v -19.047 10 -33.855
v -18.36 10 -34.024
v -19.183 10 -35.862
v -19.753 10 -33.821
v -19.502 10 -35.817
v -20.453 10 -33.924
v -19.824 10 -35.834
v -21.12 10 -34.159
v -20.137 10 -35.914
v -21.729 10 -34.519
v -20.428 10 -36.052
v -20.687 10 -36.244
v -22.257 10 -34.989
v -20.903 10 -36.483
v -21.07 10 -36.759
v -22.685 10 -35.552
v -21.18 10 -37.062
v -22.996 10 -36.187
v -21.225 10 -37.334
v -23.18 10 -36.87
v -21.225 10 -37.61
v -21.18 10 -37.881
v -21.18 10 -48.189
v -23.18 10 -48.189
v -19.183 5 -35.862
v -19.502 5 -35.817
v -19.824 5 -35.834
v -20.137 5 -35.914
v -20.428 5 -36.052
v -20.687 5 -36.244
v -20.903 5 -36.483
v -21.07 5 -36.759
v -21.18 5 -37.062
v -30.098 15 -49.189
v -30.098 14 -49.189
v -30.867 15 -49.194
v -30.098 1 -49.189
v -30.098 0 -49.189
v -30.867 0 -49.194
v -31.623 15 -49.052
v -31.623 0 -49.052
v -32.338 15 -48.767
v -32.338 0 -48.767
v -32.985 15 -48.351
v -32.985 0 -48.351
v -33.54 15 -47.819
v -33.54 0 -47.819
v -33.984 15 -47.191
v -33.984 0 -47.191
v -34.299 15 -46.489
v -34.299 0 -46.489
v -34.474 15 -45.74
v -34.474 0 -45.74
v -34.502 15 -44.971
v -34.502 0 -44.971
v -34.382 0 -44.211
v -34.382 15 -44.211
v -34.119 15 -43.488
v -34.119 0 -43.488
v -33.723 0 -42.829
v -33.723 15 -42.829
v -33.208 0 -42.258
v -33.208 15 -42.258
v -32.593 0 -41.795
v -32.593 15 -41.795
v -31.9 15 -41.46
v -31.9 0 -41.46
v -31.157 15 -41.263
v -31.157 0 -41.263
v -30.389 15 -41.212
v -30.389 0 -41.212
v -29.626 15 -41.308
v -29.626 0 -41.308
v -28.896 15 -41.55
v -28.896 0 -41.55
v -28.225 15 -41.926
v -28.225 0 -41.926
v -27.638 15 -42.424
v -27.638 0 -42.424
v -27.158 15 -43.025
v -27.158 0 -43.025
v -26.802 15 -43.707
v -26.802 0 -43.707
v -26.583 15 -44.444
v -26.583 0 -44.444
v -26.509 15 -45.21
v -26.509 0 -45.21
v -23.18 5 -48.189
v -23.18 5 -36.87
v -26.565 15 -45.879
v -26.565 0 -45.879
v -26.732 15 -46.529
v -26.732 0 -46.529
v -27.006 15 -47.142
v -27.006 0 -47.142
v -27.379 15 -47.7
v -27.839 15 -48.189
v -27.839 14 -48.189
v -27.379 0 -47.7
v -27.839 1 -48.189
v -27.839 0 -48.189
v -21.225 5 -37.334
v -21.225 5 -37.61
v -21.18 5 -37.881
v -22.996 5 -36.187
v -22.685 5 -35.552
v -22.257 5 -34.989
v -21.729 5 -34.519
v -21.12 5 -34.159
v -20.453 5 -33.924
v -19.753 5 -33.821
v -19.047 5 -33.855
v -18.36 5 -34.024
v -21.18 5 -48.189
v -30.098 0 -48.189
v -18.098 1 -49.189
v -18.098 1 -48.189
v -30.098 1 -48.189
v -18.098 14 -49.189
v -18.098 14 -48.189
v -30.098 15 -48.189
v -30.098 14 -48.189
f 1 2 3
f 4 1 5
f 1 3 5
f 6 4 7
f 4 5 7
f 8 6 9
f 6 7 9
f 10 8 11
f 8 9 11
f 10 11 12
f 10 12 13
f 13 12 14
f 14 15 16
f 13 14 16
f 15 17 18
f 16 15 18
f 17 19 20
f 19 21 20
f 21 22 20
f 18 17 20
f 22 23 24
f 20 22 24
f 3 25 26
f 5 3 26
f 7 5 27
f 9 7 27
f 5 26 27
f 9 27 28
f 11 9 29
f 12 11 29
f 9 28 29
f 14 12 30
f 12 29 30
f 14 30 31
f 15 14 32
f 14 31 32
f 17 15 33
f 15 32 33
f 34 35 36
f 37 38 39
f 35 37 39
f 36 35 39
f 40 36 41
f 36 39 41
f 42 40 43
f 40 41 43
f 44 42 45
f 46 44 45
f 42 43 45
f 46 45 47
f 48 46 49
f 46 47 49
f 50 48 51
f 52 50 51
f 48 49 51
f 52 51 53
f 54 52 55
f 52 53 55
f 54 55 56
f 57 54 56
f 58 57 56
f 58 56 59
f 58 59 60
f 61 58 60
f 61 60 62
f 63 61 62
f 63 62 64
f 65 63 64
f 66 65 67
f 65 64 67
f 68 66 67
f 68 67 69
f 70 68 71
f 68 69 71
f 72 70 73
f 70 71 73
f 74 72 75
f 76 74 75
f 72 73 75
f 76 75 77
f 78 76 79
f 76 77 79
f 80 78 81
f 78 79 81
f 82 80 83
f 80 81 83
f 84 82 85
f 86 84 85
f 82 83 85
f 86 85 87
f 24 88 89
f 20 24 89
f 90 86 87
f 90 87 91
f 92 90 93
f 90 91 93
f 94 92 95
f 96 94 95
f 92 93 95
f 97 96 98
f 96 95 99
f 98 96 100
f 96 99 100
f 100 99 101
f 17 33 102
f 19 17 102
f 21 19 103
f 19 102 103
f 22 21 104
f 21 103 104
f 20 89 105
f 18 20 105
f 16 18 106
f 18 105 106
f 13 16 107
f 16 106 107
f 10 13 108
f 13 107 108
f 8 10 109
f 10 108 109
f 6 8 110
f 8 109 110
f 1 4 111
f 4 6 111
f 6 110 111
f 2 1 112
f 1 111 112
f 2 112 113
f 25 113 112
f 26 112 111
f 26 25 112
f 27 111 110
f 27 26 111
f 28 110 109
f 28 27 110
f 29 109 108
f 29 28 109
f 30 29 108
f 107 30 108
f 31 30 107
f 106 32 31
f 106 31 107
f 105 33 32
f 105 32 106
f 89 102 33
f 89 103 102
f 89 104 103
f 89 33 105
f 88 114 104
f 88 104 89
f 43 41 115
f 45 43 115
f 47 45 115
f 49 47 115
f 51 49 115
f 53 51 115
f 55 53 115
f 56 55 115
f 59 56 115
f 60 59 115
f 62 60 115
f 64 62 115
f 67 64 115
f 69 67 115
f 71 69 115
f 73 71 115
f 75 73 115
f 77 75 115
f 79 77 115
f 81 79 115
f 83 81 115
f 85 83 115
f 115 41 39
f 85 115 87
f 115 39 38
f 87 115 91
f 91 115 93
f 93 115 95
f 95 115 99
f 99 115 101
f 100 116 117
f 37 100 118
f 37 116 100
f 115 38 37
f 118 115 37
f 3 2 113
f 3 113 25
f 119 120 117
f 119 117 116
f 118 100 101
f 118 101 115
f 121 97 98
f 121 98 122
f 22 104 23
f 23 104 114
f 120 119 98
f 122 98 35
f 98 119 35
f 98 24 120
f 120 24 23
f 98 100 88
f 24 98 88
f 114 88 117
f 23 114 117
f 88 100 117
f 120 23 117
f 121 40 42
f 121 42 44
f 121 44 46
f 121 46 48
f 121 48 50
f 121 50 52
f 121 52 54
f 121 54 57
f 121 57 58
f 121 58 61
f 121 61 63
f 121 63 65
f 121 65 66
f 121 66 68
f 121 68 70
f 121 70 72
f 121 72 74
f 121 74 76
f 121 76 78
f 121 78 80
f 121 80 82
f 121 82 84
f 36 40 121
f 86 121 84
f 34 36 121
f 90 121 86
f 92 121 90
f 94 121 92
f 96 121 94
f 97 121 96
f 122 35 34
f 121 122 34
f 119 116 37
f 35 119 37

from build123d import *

# Parameters (mm, degrees)
BOSS_EXTRUDE1_DEPTH = 15
SKETCH2_W           = 12
SKETCH2_H           = 1
CUT_EXTRUDE1_DEPTH  = 1
SKETCH5_W           = 6.028776927
SKETCH5_H           = 6.351314433
SKETCH5_W_2         = 5.976909526
SKETCH5_H_2         = 6.219071559
CUT_EXTRUDE2_DEPTH  = 21


with BuildPart() as part:
    # Sketch1 → Boss-Extrude1 (new body)
    with BuildSketch(Plane(origin=(0, 0, 0), x_dir=(1, 0, 0), z_dir=(0, 1, 0))):
        with BuildLine():
            ThreePointArc((-26.508767977, 45.209827562), (-26.856482836, 46.841027505), (-27.839174603, 48.188631218))
            Line((-27.839174603, 48.188631218), (-30.097524166, 48.188631218))
            Line((-30.097524166, 48.188631218), (-30.097524166, 49.188631218))
            ThreePointArc((-30.097524166, 49.188631218), (-33.479035241, 42.530739587), (-26.508767977, 45.209827562))
        make_face()
        with BuildLine():
            Line((-30.097524166, 48.188631218), (-27.839174603, 48.188631218))
            ThreePointArc((-27.839174603, 48.188631218), (-28.889234266, 48.86730081), (-30.097524166, 49.188631218))
            Line((-30.097524166, 49.188631218), (-30.097524166, 48.188631218))
        make_face()
        with BuildLine():
            Line((-27.839174603, 48.188631218), (-23.179530848, 48.188631218))
            Line((-23.179530848, 48.188631218), (-21.179530848, 48.188631218))
            Line((-21.179530848, 48.188631218), (-18.097524166, 48.188631218))
            Line((-18.097524166, 48.188631218), (-18.097524166, 49.188631218))
            Line((-18.097524166, 49.188631218), (-30.097524166, 49.188631218))
            ThreePointArc((-30.097524166, 49.188631218), (-28.889234266, 48.86730081), (-27.839174603, 48.188631218))
        make_face()
        with BuildLine():
            Line((-23.179530848, 48.188631218), (-23.179530848, 38.073593242))
            ThreePointArc((-23.179530848, 38.073593242), (-22.504394786, 39.656834499), (-21.179530848, 40.755559728))
            Line((-21.179530848, 40.755559728), (-21.179530848, 48.188631218))
            Line((-21.179530848, 48.188631218), (-23.179530848, 48.188631218))
        make_face()
        with BuildLine():
            Line((-21.179530848, 36.869987329), (-21.179530848, 37.062229248))
            ThreePointArc((-21.179530848, 37.062229248), (-21.23095476, 37.471790285), (-21.179530848, 37.881351323))
            Line((-21.179530848, 37.881351323), (-21.179530848, 40.755559728))
            ThreePointArc((-21.179530848, 40.755559728), (-22.504394786, 39.656834499), (-23.179530848, 38.073593242))
            Line((-23.179530848, 38.073593242), (-23.179530848, 36.869987329))
            Line((-23.179530848, 36.869987329), (-21.179530848, 36.869987329))
        make_face()
        with BuildLine():
            Line((-18.360117838, 34.024219809), (-19.183298893, 35.861921993))
            ThreePointArc((-19.183298893, 35.861921993), (-20.42797821, 36.052015934), (-21.179530848, 37.062229248))
            Line((-21.179530848, 37.062229248), (-21.179530848, 36.869987329))
            Line((-21.179530848, 36.869987329), (-23.179530848, 36.869987329))
            ThreePointArc((-23.179530848, 36.869987329), (-21.43275623, 34.324403792), (-18.360117838, 34.024219809))
        make_face()
    extrude(amount=BOSS_EXTRUDE1_DEPTH)

    # Sketch2 → Cut-Extrude1 (cut)
    with BuildSketch(Plane(origin=(0, 0, -49.188631218), x_dir=(-1, 0, 0), z_dir=(0, 0, -1))):
        with Locations((24.097524166, 14.5)):
            Rectangle(SKETCH2_W, SKETCH2_H)
        with Locations((24.097524166, 0.5)):
            Rectangle(SKETCH2_W, SKETCH2_H)
    extrude(amount=-CUT_EXTRUDE1_DEPTH, mode=Mode.SUBTRACT)

    # Sketch5 → Cut-Extrude2 (cut)
    with BuildSketch(Plane(origin=(0, 0, -48.188631218), x_dir=(-1, 0, 0), z_dir=(0, 0, -1))):
        with Locations((20.800096239, 13.175657217)):
            Rectangle(SKETCH5_W, SKETCH5_H)
        with Locations((20.774162538, 1.89046422)):
            Rectangle(SKETCH5_W_2, SKETCH5_H_2)
    extrude(amount=-CUT_EXTRUDE2_DEPTH, mode=Mode.SUBTRACT)


solid = part.part
